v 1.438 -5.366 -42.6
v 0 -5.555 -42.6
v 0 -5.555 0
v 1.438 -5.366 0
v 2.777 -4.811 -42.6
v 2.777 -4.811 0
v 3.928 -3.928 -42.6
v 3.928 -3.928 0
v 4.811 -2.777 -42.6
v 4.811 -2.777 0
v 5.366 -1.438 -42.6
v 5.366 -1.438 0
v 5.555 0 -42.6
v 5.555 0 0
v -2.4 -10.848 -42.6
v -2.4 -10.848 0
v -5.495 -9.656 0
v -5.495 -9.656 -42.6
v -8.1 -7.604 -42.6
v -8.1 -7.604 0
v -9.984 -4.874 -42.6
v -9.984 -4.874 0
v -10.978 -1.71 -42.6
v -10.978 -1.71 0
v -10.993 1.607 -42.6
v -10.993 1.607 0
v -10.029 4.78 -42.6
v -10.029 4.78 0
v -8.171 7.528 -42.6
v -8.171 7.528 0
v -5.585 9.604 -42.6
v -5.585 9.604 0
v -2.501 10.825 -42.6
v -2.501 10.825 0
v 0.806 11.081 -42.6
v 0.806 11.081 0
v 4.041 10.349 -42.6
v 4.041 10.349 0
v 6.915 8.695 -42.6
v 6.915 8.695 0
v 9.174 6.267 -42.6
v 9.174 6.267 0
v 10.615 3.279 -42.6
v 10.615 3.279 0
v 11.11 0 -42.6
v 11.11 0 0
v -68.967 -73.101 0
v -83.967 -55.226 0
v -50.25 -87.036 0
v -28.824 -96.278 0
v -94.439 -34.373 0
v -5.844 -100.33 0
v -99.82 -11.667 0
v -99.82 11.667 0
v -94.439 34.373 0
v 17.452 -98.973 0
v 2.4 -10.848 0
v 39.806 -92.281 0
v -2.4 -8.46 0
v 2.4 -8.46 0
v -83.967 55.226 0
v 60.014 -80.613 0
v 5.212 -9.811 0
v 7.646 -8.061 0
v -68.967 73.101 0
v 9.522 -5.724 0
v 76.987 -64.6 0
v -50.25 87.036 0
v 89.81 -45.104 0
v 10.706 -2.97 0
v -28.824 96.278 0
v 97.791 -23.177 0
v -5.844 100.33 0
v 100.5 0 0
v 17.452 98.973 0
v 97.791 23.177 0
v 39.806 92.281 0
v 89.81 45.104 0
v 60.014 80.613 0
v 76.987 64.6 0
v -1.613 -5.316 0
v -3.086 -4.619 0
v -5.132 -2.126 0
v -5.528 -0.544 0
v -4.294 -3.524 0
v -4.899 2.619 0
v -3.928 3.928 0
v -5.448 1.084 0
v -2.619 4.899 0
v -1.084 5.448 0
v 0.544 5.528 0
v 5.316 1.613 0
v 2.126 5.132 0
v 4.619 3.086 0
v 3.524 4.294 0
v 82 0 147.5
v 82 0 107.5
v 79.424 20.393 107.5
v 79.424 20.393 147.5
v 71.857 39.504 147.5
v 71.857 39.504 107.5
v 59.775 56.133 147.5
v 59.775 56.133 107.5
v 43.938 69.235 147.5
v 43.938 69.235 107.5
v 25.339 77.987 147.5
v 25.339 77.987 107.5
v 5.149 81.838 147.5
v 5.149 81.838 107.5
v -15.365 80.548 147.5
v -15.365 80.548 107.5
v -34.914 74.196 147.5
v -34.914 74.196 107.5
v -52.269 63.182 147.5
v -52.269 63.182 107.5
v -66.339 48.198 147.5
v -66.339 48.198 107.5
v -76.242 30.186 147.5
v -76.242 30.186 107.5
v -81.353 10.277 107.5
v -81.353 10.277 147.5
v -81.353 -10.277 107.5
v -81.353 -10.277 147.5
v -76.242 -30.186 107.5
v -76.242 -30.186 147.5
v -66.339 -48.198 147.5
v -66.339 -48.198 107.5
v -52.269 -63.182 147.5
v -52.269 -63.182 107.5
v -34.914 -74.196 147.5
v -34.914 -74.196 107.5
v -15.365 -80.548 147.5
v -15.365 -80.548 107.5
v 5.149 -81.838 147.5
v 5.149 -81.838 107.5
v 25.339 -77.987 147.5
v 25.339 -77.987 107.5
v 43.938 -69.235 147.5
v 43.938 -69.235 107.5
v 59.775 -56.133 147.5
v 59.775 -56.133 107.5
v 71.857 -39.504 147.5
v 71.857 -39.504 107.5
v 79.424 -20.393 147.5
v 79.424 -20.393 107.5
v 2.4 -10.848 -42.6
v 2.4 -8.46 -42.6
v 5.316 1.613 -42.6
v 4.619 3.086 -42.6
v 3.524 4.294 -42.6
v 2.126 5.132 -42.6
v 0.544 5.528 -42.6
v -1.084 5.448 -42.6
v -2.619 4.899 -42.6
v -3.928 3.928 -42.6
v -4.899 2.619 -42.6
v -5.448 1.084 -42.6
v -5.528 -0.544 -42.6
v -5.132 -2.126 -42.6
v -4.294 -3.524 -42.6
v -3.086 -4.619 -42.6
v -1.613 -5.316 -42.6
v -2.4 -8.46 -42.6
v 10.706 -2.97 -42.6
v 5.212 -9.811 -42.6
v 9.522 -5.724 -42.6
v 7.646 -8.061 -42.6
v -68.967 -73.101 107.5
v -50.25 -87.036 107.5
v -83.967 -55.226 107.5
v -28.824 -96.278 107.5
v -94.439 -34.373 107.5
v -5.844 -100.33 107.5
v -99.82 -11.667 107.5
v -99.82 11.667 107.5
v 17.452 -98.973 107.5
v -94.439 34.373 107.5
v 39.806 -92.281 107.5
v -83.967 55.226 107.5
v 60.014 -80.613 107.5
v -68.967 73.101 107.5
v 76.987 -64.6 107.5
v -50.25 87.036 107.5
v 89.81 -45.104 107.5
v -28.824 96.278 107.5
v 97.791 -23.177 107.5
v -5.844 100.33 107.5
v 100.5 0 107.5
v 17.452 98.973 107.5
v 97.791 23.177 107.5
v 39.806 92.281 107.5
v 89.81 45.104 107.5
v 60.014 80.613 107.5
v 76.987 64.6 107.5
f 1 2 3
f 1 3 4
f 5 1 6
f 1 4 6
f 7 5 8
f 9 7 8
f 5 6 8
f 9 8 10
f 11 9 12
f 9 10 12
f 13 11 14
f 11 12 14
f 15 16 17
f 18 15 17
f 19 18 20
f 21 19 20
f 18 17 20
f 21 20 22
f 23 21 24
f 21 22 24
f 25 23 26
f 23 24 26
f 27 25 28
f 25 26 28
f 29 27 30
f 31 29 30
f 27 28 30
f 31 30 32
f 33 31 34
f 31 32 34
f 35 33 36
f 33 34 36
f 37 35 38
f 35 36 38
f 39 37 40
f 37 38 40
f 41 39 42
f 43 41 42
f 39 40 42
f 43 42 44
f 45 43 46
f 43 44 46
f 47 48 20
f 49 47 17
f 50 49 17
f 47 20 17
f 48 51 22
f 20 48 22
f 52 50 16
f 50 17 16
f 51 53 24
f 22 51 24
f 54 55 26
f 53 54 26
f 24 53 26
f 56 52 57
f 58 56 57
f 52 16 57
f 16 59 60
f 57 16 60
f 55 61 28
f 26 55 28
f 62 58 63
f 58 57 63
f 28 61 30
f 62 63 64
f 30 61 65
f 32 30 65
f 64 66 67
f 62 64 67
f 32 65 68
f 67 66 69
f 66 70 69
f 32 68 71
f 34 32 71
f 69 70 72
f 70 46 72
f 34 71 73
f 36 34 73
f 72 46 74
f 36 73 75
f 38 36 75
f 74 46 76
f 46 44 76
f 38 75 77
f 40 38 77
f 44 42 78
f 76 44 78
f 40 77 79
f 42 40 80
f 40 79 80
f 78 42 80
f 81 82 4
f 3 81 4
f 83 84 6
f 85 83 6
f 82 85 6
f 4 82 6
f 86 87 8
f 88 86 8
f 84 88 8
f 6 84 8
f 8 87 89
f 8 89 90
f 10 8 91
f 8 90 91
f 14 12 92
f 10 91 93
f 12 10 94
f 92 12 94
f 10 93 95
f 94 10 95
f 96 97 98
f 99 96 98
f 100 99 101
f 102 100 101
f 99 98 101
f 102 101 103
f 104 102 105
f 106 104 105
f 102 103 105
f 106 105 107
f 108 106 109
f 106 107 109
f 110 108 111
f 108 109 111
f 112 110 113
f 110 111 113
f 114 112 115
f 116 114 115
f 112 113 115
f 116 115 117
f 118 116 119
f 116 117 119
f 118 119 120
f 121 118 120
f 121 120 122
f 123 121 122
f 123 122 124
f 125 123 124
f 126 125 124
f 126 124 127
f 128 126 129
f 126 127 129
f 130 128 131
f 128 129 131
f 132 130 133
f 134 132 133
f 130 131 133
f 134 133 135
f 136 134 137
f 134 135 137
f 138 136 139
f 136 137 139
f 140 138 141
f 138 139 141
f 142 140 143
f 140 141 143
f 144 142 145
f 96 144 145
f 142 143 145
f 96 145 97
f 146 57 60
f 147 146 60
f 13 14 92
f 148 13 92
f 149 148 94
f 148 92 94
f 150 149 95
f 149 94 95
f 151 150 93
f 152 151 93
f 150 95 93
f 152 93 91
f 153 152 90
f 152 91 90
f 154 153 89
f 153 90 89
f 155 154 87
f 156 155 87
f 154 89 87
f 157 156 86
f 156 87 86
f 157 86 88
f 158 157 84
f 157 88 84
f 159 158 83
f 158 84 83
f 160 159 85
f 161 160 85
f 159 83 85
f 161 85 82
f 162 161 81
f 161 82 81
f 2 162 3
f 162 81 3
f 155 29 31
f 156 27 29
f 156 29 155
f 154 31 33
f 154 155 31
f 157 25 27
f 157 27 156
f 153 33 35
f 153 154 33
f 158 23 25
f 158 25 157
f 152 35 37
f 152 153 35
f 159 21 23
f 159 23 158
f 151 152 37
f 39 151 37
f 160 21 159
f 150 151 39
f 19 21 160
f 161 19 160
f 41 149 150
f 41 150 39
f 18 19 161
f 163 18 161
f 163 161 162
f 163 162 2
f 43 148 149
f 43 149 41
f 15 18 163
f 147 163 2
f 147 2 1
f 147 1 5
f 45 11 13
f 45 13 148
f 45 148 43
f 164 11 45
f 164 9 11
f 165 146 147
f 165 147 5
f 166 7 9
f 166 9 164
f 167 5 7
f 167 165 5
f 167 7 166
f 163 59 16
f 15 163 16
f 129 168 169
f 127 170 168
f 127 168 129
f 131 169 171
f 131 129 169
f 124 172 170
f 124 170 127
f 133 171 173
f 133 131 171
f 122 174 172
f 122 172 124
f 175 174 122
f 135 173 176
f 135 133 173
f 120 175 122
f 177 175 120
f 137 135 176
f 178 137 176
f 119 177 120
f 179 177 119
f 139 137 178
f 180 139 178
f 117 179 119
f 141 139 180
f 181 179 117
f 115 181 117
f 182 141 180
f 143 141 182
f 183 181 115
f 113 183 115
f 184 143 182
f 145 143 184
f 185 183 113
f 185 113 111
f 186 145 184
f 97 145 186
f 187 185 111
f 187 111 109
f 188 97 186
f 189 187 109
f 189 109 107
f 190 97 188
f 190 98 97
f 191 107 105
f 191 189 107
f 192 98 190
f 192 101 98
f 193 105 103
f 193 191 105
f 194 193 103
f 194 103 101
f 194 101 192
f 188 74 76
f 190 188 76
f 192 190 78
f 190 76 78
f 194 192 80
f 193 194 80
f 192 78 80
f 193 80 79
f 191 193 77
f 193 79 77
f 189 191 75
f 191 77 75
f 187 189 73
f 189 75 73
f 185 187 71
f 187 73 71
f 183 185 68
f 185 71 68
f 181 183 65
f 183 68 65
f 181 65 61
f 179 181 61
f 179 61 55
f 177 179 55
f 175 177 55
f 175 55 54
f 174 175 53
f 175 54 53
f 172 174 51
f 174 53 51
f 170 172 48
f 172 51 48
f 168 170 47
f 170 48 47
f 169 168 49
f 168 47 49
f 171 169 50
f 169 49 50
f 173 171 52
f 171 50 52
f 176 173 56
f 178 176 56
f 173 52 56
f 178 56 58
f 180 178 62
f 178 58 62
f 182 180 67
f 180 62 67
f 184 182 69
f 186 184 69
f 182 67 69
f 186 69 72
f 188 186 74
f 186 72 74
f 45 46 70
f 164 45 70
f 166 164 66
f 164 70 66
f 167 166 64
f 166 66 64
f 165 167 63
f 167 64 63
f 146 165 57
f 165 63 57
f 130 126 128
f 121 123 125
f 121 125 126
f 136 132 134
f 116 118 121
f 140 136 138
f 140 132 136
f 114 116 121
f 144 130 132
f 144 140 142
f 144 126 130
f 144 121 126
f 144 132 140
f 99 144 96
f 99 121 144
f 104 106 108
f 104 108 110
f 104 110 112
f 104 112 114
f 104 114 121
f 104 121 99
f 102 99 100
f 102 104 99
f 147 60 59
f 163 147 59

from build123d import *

# Parameters (mm, degrees)
F0_R     = 100.5
F1_DEPTH = 107.5
F2_R     = 82
F3_DEPTH = 40
F5_DEPTH = 42.6


with BuildPart() as f1:
    # F0 (on Top) → F1 (new body)
    with BuildSketch(Plane.XY):
        Circle(F0_R)
    extrude(amount=F1_DEPTH)

    # F2 (on face) → F3 (join)
    with BuildSketch(Plane.XY.offset(107.5)):
        Circle(F2_R)
    extrude(amount=F3_DEPTH)

    # F4 (on face) → F5 (join)
    with BuildSketch(Plane(origin=(0, 0, 0), x_dir=(1, 0, 0), z_dir=(0, 0, -1))):
        with BuildLine():
            ThreePointArc((-2.4, 10.847677), (-6.955864, -8.663028), (11.11, 0))
            ThreePointArc((11.11, 0), (8.663028, 6.955864), (2.4, 10.847677))
            Line((2.4, 10.847677), (2.4, 8.46))
            Line((2.4, 8.46), (0, 8.46))
            Line((0, 8.46), (-2.4, 8.46))
            Line((-2.4, 8.46), (-2.4, 10.847677))
        make_face()
        with BuildLine():
            ThreePointArc((5.555, 0), (-3.927978, -3.927978), (0, 5.555))
            ThreePointArc((0, 5.555), (3.927978, 3.927978), (5.555, 0))
        make_face(mode=Mode.SUBTRACT)
    extrude(amount=F5_DEPTH)


solid = f1.part
